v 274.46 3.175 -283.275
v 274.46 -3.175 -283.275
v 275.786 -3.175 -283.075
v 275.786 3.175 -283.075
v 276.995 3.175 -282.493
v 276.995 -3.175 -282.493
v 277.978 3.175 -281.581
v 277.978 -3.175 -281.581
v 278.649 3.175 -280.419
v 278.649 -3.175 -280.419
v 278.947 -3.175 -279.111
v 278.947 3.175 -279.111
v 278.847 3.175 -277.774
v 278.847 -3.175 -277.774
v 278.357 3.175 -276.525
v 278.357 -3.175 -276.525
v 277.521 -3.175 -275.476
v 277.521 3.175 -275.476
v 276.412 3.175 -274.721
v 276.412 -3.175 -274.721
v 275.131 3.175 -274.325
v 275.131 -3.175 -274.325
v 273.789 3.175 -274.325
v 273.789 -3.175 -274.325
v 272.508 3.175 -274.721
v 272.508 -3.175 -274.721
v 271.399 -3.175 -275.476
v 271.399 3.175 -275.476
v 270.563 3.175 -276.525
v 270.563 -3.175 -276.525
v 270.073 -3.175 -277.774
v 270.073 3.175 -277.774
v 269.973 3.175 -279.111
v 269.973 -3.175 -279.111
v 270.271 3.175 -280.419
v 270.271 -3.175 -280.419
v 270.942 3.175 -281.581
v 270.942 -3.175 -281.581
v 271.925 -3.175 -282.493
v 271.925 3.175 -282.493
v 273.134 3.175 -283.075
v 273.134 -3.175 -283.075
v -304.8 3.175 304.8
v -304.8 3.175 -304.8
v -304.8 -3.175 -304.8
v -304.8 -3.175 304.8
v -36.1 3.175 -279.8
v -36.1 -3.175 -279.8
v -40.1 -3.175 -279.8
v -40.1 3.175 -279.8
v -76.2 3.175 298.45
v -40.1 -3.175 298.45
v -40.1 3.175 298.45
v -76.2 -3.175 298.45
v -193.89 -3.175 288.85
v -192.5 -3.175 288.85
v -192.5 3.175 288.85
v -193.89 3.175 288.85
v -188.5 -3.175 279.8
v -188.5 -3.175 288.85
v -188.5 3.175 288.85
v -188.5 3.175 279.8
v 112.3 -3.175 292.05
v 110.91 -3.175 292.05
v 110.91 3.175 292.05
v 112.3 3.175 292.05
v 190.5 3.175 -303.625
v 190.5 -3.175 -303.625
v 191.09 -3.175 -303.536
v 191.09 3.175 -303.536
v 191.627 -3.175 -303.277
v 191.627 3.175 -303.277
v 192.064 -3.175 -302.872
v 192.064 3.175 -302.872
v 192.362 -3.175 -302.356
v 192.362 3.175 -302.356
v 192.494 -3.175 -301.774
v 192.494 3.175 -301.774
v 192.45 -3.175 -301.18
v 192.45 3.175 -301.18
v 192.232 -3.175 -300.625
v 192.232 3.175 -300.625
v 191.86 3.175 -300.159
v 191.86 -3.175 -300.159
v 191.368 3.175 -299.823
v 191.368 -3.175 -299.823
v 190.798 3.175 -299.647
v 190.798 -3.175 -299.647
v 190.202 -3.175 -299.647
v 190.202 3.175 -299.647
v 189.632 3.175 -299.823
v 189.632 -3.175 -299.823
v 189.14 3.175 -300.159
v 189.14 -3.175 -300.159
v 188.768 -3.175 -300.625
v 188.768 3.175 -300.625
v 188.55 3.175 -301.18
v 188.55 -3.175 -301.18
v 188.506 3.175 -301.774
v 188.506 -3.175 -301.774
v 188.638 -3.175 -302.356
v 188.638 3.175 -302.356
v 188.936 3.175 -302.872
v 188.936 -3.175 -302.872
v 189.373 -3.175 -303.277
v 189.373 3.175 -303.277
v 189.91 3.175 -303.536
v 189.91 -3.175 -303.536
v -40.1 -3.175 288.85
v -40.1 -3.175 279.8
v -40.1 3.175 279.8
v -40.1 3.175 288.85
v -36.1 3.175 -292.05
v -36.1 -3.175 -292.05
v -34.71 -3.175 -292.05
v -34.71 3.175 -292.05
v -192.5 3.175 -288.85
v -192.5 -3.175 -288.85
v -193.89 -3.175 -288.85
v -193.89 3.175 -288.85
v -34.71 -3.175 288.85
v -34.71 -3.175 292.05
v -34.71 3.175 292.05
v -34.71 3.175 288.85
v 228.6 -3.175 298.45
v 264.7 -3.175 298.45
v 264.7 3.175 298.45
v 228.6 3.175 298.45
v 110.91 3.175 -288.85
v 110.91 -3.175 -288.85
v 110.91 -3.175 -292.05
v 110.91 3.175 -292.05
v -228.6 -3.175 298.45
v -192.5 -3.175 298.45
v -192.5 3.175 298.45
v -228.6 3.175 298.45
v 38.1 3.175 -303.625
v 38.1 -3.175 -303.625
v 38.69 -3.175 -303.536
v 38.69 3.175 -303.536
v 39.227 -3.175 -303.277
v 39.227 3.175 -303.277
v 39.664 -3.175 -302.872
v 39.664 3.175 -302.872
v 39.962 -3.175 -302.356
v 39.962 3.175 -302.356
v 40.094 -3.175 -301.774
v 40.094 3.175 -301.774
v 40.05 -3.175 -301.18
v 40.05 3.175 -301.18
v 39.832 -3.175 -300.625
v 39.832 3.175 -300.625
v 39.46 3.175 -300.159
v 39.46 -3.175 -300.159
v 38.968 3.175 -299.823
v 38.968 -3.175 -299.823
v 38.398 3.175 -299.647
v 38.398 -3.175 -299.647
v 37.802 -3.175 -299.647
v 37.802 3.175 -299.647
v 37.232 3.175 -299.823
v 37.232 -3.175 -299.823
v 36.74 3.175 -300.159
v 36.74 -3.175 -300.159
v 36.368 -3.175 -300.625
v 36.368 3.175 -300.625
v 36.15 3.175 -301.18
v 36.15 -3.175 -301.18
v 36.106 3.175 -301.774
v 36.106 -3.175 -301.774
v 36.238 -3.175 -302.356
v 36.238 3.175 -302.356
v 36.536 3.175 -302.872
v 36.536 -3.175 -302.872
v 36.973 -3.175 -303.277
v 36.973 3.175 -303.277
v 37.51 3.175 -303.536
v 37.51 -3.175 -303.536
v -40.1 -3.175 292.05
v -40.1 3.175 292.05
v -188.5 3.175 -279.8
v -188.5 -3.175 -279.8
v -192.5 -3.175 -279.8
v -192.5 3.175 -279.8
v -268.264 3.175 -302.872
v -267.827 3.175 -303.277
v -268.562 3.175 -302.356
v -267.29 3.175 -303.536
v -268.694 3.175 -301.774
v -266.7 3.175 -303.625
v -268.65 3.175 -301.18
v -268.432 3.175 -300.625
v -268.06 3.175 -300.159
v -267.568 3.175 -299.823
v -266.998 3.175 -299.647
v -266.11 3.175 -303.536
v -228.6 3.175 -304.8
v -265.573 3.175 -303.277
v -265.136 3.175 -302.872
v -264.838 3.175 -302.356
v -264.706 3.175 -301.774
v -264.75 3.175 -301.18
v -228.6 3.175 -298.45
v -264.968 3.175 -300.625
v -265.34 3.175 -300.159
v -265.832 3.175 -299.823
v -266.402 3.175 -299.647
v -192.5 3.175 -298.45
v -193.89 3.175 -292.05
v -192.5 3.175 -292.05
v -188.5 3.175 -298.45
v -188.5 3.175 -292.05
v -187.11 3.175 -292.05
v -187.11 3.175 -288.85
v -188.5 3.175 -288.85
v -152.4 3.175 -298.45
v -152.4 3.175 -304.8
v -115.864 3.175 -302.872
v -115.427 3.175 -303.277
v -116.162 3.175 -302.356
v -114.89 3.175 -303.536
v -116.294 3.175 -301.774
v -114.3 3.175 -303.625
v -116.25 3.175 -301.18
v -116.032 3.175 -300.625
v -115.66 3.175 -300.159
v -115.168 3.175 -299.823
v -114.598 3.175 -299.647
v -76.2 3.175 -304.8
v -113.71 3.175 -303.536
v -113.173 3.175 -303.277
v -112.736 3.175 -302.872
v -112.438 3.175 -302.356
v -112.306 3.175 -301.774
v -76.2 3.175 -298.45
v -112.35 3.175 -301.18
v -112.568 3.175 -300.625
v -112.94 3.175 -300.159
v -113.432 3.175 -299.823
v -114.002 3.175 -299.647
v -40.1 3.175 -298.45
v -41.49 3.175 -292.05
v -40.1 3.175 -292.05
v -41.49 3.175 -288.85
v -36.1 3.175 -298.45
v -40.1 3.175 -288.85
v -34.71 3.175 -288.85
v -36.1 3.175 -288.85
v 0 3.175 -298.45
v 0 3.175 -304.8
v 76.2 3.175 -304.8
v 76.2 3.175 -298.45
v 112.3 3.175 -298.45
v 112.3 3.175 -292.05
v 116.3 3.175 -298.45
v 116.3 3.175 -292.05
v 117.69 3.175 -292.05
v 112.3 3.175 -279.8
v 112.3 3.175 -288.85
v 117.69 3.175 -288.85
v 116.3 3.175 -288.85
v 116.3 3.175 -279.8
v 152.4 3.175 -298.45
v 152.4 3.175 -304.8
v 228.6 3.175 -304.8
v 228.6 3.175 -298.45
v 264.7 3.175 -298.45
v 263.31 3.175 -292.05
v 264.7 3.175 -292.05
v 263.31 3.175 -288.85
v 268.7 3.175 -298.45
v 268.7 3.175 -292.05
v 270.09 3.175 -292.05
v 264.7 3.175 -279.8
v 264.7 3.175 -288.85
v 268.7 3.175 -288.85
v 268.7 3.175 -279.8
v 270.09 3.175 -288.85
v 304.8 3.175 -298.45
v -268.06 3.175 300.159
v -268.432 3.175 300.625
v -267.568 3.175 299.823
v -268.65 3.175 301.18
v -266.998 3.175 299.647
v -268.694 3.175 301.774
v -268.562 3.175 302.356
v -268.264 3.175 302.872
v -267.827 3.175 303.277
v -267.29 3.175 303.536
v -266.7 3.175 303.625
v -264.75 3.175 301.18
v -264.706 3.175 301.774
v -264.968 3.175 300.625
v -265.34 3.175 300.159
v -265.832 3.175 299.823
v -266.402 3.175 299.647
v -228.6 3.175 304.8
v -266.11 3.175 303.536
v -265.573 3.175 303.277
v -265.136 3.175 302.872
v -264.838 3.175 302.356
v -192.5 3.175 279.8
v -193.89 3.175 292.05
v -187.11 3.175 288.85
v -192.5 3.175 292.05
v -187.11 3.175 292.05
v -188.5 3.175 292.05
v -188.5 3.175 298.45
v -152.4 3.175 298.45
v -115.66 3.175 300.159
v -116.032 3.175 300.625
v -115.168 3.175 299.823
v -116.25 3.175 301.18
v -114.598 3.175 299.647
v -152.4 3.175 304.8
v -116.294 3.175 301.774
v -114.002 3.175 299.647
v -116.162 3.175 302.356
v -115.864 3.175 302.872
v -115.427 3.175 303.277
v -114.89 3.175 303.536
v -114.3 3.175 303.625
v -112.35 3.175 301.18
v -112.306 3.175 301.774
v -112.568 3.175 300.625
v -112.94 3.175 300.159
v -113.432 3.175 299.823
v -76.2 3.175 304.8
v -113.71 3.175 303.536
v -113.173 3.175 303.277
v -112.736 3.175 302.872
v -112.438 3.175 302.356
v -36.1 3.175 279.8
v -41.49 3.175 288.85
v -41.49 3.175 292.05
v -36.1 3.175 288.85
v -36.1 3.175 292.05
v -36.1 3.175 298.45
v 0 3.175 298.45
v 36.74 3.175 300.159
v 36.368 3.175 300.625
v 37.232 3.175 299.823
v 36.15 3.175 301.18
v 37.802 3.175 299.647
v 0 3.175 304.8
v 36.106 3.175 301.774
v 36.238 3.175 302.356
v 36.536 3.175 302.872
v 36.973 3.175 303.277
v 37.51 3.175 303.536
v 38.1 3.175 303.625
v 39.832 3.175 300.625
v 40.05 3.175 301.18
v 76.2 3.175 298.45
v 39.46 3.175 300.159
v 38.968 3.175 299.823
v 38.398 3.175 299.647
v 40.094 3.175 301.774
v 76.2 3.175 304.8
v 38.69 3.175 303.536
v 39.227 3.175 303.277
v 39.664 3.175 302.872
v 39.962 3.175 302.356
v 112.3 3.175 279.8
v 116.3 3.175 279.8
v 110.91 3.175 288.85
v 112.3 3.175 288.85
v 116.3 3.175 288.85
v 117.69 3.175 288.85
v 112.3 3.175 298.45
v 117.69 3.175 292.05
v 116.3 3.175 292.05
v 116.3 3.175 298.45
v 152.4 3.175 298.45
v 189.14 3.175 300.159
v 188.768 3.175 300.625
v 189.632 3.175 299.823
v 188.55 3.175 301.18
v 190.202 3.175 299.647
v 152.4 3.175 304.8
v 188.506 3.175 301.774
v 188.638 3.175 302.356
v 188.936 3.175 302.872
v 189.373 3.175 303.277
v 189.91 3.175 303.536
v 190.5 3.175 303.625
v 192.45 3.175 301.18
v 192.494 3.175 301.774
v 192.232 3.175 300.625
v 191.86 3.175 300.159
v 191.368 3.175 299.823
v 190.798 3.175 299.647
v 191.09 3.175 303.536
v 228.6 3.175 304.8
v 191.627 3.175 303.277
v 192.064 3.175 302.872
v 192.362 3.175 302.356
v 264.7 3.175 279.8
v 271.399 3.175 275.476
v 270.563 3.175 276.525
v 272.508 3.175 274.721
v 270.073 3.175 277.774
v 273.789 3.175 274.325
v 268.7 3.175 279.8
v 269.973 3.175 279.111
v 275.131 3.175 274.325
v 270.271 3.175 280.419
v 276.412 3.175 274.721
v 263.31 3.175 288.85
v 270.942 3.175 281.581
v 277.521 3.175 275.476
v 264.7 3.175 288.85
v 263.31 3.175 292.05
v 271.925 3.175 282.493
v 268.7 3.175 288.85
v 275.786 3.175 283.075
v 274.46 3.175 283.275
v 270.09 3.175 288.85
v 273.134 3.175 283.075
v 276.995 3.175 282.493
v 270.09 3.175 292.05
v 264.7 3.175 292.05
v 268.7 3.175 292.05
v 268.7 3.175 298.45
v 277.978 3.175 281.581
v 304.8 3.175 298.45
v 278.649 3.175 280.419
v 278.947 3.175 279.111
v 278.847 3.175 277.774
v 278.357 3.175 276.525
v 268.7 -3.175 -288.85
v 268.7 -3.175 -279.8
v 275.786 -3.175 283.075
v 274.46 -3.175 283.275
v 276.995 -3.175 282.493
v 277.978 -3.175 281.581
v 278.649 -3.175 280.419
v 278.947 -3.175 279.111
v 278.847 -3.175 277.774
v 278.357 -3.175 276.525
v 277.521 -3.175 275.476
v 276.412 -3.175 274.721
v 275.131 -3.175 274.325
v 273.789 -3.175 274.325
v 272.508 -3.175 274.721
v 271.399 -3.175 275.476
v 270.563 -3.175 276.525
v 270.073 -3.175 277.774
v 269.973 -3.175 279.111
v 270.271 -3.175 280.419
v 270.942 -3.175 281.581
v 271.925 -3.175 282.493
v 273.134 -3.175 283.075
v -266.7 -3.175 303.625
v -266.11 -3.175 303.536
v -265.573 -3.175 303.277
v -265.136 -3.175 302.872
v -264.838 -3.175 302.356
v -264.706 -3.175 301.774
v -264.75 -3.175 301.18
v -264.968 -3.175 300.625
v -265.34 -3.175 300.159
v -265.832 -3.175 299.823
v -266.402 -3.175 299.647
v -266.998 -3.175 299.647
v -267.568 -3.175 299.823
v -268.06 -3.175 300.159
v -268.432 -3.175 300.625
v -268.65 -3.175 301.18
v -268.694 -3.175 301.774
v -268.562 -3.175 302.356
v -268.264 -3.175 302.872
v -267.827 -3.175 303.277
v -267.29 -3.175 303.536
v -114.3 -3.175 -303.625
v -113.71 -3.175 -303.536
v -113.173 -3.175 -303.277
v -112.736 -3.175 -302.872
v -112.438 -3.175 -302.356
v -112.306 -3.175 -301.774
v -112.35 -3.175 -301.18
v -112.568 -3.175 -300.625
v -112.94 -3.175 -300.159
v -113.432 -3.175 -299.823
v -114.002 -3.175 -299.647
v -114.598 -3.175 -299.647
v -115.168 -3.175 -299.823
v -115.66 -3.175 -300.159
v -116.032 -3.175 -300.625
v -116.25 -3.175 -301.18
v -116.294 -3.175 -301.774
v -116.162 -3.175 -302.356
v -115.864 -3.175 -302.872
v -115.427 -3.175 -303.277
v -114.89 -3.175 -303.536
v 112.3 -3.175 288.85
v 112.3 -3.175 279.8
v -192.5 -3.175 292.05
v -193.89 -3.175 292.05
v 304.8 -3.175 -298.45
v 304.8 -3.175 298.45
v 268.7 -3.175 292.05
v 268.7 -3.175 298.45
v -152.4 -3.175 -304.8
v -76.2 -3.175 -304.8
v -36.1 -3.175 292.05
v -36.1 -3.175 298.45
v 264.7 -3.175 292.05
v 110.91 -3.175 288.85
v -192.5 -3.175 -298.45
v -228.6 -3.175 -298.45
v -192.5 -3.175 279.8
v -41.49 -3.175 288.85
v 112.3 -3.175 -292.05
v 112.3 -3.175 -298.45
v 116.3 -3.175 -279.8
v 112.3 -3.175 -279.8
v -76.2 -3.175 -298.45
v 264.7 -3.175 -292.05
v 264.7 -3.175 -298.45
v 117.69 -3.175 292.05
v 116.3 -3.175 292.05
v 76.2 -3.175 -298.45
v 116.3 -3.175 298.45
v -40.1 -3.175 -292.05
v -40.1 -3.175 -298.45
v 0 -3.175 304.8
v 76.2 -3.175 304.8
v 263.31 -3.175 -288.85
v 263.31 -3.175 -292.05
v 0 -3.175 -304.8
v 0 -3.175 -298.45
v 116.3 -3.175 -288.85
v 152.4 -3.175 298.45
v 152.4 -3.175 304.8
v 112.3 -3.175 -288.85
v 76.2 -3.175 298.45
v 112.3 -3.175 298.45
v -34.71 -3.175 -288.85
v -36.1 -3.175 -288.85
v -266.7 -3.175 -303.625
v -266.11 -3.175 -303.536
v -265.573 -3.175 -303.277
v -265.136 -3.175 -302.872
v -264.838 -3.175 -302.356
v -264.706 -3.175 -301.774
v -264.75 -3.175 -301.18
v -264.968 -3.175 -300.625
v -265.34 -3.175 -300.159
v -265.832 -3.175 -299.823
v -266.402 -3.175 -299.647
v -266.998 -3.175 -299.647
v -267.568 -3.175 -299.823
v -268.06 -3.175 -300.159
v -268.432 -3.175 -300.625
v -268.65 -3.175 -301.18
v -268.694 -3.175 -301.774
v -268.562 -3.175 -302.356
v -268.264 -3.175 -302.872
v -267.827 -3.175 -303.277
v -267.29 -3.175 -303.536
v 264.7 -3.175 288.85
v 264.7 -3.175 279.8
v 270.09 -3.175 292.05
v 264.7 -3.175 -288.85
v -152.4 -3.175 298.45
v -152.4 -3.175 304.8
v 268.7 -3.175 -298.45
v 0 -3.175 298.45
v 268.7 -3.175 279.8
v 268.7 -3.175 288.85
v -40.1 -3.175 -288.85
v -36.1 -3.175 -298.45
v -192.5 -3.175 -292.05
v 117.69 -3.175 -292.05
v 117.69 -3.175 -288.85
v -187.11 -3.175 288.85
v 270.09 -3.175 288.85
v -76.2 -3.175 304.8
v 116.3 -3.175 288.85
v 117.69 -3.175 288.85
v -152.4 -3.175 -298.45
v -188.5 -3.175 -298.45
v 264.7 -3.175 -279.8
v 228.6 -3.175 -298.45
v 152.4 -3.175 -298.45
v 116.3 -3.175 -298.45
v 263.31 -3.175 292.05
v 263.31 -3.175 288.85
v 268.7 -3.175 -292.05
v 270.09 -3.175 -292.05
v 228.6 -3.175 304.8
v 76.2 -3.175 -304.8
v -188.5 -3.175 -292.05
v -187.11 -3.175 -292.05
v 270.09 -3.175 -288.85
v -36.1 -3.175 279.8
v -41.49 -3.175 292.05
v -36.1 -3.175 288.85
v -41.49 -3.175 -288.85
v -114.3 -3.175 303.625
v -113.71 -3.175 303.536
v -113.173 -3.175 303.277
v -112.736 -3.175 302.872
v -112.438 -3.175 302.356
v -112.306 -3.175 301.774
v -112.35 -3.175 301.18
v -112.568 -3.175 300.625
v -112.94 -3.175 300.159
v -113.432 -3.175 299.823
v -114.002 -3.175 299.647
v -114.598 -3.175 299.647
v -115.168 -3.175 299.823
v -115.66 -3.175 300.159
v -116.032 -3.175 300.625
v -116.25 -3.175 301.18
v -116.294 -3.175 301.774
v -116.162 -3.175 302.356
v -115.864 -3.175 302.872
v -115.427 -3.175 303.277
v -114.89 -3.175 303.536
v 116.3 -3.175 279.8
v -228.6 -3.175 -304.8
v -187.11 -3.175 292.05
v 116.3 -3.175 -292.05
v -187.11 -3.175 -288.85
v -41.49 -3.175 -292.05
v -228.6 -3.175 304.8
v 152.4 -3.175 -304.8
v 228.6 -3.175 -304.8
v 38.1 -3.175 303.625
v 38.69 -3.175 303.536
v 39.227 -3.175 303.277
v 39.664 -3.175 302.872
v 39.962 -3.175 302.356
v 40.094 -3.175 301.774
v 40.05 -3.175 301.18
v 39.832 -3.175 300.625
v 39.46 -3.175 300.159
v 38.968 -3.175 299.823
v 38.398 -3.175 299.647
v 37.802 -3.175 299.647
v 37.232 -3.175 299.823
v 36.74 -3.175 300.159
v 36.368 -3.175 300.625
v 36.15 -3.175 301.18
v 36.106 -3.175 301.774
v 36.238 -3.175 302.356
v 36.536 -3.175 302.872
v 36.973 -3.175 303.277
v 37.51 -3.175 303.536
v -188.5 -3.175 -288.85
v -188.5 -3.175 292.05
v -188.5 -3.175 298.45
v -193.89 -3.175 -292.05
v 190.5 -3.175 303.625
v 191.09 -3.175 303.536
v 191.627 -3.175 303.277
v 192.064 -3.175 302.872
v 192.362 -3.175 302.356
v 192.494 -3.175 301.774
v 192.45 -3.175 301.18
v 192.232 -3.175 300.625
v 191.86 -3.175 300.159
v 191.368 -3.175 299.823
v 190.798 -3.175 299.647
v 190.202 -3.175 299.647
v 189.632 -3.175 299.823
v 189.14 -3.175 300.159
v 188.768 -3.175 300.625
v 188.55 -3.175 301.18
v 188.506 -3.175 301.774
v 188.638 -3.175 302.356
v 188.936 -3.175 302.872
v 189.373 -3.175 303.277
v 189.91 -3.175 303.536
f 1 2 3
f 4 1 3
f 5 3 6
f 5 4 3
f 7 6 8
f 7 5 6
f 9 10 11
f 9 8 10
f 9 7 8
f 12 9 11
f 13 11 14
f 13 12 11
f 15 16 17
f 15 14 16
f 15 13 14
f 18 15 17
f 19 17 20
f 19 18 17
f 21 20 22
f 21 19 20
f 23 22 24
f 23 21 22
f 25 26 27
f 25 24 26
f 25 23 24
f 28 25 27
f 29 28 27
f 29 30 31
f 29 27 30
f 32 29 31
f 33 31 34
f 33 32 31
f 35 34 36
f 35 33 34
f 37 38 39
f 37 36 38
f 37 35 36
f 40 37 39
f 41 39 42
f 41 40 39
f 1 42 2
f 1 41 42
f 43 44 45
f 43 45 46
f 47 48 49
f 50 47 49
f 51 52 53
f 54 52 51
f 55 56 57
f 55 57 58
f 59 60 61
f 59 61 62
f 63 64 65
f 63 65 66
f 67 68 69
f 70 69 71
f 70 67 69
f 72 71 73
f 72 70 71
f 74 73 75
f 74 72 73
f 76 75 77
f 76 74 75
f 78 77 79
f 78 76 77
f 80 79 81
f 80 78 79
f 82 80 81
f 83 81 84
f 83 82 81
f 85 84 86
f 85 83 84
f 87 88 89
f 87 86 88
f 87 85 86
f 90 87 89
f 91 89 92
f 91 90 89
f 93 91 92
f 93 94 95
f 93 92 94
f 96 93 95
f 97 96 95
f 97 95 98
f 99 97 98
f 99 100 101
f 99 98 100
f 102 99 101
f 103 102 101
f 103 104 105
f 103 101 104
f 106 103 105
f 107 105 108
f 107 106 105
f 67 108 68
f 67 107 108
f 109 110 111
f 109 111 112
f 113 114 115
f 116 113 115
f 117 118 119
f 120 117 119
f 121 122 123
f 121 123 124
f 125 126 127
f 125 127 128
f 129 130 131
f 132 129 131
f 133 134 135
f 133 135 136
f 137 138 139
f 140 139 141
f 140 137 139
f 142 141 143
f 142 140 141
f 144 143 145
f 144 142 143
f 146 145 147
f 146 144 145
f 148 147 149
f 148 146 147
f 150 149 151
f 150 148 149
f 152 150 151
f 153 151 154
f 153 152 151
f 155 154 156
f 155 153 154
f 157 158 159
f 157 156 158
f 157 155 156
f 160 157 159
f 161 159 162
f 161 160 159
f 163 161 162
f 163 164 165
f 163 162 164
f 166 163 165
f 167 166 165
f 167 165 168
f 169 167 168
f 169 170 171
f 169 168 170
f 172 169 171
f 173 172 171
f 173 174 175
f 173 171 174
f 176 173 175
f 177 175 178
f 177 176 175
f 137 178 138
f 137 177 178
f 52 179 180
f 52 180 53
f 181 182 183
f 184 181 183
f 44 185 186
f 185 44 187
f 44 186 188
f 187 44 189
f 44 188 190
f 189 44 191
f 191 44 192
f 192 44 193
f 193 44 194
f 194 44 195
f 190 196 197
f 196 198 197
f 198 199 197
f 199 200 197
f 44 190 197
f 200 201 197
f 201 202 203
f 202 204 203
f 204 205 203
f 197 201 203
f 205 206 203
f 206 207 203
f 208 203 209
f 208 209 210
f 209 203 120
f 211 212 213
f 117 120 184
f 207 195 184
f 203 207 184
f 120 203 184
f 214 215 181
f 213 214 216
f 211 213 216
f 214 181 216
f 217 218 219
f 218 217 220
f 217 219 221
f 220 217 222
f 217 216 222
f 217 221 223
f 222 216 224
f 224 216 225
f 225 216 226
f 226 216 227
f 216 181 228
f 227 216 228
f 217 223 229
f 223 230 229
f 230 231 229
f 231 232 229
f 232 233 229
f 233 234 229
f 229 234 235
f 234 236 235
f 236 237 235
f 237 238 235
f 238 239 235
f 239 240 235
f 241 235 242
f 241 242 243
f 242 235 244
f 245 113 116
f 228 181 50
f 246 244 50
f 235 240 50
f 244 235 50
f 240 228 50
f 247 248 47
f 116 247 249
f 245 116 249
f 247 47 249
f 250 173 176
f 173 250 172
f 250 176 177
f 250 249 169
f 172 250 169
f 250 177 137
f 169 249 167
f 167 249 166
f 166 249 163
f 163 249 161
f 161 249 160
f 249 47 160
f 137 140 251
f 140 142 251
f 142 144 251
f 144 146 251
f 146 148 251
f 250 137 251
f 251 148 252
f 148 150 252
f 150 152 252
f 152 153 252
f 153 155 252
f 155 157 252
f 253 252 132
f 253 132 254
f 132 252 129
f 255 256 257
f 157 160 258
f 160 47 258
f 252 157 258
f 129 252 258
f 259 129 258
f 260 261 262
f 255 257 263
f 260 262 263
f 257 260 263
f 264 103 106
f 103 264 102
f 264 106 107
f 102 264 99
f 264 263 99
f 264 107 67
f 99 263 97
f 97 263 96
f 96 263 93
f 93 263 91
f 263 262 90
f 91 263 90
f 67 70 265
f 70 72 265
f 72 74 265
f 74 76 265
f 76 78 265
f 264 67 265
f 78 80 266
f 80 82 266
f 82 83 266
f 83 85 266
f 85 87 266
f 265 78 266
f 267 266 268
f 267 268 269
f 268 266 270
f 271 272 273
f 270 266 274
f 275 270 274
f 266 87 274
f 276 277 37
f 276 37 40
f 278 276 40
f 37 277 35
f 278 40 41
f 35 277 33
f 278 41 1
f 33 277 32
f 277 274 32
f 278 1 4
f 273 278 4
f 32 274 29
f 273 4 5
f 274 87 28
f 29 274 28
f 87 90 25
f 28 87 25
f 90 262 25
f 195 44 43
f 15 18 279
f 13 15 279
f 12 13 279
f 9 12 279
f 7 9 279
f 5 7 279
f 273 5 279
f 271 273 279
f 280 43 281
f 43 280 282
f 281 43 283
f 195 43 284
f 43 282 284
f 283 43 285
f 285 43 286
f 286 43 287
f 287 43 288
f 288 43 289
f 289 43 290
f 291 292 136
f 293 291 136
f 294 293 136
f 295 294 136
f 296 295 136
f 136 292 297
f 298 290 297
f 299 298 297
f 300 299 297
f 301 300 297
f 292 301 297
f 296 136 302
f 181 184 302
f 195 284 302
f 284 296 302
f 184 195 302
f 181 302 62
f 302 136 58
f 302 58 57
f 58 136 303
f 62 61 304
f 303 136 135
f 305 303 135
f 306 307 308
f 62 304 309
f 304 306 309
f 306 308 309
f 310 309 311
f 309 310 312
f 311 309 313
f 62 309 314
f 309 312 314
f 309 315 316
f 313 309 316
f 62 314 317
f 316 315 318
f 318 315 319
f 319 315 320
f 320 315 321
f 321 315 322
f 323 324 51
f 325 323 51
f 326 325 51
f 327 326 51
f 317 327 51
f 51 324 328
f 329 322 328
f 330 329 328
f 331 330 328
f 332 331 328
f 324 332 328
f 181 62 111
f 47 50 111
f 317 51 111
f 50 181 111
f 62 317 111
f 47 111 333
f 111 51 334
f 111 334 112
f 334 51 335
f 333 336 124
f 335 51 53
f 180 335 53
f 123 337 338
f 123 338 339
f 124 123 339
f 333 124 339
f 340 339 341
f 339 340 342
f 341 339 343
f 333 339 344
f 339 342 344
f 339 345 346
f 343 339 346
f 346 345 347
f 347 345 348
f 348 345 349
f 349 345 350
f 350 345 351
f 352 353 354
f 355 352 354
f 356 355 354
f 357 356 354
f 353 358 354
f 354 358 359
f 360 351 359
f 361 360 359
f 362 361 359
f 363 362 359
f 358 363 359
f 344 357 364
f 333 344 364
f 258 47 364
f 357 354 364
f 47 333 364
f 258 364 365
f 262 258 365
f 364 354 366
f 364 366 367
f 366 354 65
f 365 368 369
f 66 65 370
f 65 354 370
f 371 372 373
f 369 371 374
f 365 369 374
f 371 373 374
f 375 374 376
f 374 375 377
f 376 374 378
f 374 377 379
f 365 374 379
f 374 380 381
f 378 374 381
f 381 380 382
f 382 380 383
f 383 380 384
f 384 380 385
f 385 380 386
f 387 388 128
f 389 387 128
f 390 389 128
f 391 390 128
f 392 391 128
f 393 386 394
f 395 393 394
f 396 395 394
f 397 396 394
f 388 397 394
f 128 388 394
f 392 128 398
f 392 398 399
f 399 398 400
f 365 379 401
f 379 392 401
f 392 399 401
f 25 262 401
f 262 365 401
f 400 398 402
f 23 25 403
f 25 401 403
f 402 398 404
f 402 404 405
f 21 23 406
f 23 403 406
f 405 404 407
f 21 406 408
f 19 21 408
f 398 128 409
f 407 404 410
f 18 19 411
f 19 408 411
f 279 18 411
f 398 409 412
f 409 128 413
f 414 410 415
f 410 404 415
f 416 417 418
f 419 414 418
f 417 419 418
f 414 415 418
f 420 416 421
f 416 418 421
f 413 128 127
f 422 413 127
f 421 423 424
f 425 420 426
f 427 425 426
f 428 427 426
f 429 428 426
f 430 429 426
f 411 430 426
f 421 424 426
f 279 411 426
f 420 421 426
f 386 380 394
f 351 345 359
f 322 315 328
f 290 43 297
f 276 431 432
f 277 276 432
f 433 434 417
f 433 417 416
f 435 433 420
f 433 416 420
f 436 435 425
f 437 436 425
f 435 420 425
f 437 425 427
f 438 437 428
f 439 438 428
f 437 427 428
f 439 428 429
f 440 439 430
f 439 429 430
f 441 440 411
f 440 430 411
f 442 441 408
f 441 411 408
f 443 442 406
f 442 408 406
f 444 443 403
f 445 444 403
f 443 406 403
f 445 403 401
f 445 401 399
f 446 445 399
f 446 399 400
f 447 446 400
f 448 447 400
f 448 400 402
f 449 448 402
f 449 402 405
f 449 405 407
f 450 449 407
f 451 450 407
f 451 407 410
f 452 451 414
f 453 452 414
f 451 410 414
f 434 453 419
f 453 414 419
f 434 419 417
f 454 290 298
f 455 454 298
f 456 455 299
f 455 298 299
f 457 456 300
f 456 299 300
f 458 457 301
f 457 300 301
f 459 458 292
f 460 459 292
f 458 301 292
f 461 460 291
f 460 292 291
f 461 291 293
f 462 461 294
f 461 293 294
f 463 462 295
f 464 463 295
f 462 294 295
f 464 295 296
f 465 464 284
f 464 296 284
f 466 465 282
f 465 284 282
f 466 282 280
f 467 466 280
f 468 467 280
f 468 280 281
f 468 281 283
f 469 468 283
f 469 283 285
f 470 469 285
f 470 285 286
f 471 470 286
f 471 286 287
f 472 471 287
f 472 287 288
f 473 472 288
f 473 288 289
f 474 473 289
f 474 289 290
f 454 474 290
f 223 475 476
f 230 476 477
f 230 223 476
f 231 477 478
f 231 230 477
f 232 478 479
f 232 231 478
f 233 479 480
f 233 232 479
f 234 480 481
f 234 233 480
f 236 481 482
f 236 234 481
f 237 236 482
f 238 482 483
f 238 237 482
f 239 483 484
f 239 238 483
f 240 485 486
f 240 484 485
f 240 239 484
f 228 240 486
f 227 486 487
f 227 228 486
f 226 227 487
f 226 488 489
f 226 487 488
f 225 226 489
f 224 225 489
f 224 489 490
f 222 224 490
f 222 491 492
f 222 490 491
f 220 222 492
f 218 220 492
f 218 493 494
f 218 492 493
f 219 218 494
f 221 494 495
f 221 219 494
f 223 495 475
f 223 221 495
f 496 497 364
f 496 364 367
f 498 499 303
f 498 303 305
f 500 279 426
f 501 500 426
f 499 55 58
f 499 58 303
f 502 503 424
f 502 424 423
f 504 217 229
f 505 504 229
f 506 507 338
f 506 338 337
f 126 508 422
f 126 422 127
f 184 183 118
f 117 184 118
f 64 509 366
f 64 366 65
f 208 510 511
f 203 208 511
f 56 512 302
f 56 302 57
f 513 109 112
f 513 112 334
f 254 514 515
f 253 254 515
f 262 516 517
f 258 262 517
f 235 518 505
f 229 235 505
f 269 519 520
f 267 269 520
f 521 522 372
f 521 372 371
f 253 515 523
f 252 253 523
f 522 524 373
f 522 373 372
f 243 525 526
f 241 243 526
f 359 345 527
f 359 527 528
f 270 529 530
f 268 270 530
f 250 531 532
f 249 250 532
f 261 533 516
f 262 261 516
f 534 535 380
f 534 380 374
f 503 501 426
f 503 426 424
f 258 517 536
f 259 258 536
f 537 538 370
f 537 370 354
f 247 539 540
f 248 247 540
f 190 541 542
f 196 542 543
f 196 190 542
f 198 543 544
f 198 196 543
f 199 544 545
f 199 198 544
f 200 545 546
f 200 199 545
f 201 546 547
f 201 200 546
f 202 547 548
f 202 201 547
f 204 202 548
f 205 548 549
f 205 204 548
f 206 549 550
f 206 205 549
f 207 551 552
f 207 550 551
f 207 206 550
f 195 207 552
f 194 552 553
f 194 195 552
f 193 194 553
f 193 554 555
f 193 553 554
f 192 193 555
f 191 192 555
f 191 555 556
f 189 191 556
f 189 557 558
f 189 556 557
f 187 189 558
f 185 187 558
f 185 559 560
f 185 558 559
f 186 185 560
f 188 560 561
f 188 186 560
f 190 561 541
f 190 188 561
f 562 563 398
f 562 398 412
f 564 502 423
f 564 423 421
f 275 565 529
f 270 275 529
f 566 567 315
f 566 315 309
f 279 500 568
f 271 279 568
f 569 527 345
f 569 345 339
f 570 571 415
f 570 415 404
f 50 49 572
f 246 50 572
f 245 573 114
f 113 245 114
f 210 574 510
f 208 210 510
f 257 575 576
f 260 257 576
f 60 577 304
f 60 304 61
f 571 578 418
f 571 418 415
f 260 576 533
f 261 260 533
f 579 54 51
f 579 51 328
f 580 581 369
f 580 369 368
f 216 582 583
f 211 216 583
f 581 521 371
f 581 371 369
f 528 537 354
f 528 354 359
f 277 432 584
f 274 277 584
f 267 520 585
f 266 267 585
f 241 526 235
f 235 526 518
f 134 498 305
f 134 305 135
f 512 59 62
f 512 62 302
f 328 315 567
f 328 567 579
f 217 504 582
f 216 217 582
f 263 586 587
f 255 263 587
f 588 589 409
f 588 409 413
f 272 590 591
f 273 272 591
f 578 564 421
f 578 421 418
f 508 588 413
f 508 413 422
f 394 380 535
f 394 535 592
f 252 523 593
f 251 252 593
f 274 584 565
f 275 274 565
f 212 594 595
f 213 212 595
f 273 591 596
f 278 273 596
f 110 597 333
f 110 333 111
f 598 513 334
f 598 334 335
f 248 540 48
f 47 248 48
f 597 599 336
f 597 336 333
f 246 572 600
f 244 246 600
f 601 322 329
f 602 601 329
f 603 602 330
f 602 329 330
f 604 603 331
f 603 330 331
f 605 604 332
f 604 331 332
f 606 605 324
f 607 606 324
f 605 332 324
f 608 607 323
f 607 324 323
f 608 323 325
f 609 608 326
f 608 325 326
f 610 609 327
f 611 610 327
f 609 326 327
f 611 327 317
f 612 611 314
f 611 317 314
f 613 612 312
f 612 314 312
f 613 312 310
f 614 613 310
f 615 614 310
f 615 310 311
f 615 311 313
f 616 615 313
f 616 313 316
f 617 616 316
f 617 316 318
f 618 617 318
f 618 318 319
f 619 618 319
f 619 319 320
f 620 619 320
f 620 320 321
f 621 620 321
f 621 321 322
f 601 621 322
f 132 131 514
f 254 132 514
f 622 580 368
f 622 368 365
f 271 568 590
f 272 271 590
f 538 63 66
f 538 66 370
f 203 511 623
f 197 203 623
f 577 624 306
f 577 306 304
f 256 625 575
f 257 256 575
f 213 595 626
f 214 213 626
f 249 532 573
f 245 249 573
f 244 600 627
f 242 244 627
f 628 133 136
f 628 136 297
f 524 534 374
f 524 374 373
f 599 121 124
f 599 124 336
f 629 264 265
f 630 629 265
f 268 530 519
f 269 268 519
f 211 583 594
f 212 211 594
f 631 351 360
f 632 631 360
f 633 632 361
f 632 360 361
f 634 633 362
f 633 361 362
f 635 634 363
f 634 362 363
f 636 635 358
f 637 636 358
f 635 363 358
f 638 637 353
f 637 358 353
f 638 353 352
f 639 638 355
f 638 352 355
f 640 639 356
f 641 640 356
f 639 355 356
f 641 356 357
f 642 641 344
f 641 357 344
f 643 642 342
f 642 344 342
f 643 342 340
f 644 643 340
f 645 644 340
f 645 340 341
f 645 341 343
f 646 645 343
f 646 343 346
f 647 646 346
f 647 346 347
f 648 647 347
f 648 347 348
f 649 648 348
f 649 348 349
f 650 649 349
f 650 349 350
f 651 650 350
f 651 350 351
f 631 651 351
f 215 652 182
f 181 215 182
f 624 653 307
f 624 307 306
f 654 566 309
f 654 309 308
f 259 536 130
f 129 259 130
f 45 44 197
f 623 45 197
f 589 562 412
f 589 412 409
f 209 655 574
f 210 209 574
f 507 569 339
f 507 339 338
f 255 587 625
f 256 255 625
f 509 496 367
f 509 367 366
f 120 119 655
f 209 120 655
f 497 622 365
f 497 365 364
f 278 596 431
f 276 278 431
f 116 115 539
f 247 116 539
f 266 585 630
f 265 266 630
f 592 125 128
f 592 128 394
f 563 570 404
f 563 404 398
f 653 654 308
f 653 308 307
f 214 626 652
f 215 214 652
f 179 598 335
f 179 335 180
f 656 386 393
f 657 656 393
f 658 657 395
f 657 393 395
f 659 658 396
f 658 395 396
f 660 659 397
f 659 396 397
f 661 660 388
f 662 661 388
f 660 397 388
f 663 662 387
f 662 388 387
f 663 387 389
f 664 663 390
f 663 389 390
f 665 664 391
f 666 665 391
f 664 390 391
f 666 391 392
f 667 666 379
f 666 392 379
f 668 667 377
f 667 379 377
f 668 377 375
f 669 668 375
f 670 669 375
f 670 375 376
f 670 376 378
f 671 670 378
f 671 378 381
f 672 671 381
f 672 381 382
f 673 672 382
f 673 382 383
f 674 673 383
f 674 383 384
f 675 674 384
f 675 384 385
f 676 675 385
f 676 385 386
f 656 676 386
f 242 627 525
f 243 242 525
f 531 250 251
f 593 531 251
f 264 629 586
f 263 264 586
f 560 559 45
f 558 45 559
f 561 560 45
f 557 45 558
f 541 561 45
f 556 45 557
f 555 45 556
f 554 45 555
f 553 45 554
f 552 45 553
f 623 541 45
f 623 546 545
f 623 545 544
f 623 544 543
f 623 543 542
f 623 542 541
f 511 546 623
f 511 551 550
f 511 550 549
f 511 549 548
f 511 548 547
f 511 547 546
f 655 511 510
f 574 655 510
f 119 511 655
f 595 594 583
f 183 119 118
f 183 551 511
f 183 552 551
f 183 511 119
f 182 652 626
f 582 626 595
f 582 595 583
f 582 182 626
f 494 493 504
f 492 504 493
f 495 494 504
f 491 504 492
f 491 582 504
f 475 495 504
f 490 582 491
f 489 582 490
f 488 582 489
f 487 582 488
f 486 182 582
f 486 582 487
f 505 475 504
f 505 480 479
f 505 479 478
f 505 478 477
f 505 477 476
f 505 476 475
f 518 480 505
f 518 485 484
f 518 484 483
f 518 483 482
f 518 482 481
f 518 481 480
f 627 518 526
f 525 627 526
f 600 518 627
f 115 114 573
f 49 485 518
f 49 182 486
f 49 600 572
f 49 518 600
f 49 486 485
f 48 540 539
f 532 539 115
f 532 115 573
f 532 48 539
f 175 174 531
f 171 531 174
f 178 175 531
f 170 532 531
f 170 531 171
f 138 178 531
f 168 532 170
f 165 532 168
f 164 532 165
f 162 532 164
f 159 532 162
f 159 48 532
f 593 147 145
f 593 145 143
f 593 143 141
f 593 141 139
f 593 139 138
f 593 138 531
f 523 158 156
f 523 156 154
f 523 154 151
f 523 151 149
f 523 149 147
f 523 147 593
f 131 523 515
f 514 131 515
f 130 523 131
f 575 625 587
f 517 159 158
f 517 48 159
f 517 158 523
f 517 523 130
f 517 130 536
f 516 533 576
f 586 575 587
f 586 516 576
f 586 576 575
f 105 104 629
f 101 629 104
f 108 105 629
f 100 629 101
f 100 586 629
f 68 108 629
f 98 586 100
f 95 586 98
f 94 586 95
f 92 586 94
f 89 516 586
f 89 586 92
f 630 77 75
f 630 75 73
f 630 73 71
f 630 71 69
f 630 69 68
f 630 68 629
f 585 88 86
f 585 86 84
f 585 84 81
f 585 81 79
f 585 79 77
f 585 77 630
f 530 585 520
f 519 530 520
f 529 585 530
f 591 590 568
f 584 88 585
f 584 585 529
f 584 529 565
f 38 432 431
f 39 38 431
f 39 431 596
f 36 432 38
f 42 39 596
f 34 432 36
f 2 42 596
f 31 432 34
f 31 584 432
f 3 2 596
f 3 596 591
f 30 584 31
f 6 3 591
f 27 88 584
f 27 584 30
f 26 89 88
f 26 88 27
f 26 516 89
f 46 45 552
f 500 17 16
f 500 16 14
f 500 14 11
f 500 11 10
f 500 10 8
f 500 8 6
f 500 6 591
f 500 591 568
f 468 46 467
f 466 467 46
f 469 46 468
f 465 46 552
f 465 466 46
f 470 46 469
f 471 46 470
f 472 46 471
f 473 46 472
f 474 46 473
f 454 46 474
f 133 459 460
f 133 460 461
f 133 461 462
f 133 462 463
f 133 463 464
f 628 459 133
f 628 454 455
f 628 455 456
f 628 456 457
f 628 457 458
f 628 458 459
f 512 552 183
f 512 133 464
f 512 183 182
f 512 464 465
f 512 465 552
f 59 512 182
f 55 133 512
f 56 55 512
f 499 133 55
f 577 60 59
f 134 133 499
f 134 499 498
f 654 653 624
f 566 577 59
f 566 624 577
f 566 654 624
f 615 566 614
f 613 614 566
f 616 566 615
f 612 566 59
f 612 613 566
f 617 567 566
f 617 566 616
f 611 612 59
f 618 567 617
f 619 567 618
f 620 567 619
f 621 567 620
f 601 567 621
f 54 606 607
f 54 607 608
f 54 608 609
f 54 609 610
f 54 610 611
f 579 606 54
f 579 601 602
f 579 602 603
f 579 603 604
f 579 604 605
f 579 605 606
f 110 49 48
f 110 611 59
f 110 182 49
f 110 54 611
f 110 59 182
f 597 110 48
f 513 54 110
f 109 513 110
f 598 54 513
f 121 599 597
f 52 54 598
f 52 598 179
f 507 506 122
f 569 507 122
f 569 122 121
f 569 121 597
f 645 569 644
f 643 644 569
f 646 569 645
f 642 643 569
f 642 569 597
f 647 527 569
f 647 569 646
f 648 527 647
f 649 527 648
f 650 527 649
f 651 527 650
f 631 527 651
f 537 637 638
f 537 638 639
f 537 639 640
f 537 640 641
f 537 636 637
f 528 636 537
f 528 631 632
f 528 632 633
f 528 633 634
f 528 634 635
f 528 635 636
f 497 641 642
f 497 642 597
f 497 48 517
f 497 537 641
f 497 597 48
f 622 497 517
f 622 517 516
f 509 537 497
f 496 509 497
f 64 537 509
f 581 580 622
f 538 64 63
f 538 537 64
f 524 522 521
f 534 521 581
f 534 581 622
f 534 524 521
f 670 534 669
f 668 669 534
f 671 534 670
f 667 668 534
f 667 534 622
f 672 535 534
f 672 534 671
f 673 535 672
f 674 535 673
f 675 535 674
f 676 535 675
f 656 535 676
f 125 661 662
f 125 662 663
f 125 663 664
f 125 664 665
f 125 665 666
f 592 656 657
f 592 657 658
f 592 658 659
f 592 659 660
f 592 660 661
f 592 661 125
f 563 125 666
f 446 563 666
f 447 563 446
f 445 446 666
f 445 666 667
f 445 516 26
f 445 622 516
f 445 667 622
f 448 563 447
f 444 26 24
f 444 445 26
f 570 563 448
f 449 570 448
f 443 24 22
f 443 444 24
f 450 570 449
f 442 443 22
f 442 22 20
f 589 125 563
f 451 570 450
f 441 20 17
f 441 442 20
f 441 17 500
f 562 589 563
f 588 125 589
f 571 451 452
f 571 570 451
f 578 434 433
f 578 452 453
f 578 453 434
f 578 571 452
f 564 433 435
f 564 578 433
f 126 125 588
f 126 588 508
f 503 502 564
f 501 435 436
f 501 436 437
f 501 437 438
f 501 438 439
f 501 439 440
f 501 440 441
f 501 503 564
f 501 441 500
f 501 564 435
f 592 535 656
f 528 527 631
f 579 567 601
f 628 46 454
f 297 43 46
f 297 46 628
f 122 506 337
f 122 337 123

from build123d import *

# Parameters (mm, degrees)
SKETCH1_W           = 609.6
SKETCH1_H           = 304.8
BOSS_EXTRUDE1_DEPTH = 3.175
SKETCH2_R           = 2
SKETCH2_R_2         = 4.5
CUT_EXTRUDE1_DEPTH  = 432.099063441


with BuildPart() as part:
    # Sketch1 → Boss-Extrude1 (new, symmetric)
    with BuildSketch(Plane(origin=(0, 0, 0), x_dir=(1, 0, 0), z_dir=(0, 1, 0))):
        with Locations((0, -152.4)):
            Rectangle(SKETCH1_W, SKETCH1_H)
    boss_extrude1 = extrude(amount=BOSS_EXTRUDE1_DEPTH, both=True)

    # Sketch2 → Cut-Extrude1 (cut, symmetric)
    with BuildSketch(Plane(origin=(0, 3.175, 0), x_dir=(1, 0, 0), z_dir=(0, 1, 0))):
        with Locations(Location((-266.7, -301.625, 0), (0, 0, 270))):
            Circle(SKETCH2_R)
        Polygon((-228.6, -298.45), (-228.6, -304.8), (-152.4, -304.8), (-152.4, -298.45), (-188.5, -298.45), (-192.5, -298.45), align=None)
        Polygon((-192.5, -292.05), (-192.5, -298.45), (-188.5, -298.45), (-188.5, -292.05), (-187.11, -292.05), (-187.11, -288.85), (-188.5, -288.85), (-188.5, -279.8), (-192.5, -279.8), (-192.5, -288.85), (-193.89, -288.85), (-193.89, -292.05), align=None)
        with Locations(Location((-114.3, -301.625, 0), (0, 0, 270))):
            Circle(SKETCH2_R)
        Polygon((-76.2, -298.45), (-76.2, -304.8), (0, -304.8), (0, -298.45), (-36.1, -298.45), (-40.1, -298.45), align=None)
        Polygon((-40.1, -292.05), (-40.1, -298.45), (-36.1, -298.45), (-36.1, -292.05), (-34.71, -292.05), (-34.71, -288.85), (-36.1, -288.85), (-36.1, -279.8), (-40.1, -279.8), (-40.1, -288.85), (-41.49, -288.85), (-41.49, -292.05), align=None)
        with Locations(Location((38.1, -301.625, 0), (0, 0, 270))):
            Circle(SKETCH2_R)
        Polygon((76.2, -298.45), (76.2, -304.8), (152.4, -304.8), (152.4, -298.45), (116.3, -298.45), (112.3, -298.45), align=None)
        Polygon((112.3, -292.05), (112.3, -298.45), (116.3, -298.45), (116.3, -292.05), (117.69, -292.05), (117.69, -288.85), (116.3, -288.85), (116.3, -279.8), (112.3, -279.8), (112.3, -288.85), (110.91, -288.85), (110.91, -292.05), align=None)
        with Locations(Location((190.5, -301.625, 0), (0, 0, 270))):
            Circle(SKETCH2_R)
        Polygon((228.6, -298.45), (228.6, -304.8), (304.8, -304.8), (304.8, -298.45), (268.7, -298.45), (264.7, -298.45), align=None)
        Polygon((264.7, -292.05), (264.7, -298.45), (268.7, -298.45), (268.7, -292.05), (270.09, -292.05), (270.09, -288.85), (268.7, -288.85), (268.7, -279.8), (264.7, -279.8), (264.7, -288.85), (263.31, -288.85), (263.31, -292.05), align=None)
        with Locations(Location((274.46, -278.775, 0), (0, 0, 270))):
            Circle(SKETCH2_R_2)
    cut_extrude1 = extrude(amount=CUT_EXTRUDE1_DEPTH, both=True, mode=Mode.SUBTRACT)

    # Mirror1: Boss-Extrude1, Cut-Extrude1 across plane
    add(boss_extrude1.mirror(Plane(origin=(0, 3.175, 0), x_dir=(1, 0, 0), z_dir=(0, 0, -1))))
    add(cut_extrude1.mirror(Plane(origin=(0, 3.175, 0), x_dir=(1, 0, 0), z_dir=(0, 0, -1))), mode=Mode.SUBTRACT)


solid = part.part
